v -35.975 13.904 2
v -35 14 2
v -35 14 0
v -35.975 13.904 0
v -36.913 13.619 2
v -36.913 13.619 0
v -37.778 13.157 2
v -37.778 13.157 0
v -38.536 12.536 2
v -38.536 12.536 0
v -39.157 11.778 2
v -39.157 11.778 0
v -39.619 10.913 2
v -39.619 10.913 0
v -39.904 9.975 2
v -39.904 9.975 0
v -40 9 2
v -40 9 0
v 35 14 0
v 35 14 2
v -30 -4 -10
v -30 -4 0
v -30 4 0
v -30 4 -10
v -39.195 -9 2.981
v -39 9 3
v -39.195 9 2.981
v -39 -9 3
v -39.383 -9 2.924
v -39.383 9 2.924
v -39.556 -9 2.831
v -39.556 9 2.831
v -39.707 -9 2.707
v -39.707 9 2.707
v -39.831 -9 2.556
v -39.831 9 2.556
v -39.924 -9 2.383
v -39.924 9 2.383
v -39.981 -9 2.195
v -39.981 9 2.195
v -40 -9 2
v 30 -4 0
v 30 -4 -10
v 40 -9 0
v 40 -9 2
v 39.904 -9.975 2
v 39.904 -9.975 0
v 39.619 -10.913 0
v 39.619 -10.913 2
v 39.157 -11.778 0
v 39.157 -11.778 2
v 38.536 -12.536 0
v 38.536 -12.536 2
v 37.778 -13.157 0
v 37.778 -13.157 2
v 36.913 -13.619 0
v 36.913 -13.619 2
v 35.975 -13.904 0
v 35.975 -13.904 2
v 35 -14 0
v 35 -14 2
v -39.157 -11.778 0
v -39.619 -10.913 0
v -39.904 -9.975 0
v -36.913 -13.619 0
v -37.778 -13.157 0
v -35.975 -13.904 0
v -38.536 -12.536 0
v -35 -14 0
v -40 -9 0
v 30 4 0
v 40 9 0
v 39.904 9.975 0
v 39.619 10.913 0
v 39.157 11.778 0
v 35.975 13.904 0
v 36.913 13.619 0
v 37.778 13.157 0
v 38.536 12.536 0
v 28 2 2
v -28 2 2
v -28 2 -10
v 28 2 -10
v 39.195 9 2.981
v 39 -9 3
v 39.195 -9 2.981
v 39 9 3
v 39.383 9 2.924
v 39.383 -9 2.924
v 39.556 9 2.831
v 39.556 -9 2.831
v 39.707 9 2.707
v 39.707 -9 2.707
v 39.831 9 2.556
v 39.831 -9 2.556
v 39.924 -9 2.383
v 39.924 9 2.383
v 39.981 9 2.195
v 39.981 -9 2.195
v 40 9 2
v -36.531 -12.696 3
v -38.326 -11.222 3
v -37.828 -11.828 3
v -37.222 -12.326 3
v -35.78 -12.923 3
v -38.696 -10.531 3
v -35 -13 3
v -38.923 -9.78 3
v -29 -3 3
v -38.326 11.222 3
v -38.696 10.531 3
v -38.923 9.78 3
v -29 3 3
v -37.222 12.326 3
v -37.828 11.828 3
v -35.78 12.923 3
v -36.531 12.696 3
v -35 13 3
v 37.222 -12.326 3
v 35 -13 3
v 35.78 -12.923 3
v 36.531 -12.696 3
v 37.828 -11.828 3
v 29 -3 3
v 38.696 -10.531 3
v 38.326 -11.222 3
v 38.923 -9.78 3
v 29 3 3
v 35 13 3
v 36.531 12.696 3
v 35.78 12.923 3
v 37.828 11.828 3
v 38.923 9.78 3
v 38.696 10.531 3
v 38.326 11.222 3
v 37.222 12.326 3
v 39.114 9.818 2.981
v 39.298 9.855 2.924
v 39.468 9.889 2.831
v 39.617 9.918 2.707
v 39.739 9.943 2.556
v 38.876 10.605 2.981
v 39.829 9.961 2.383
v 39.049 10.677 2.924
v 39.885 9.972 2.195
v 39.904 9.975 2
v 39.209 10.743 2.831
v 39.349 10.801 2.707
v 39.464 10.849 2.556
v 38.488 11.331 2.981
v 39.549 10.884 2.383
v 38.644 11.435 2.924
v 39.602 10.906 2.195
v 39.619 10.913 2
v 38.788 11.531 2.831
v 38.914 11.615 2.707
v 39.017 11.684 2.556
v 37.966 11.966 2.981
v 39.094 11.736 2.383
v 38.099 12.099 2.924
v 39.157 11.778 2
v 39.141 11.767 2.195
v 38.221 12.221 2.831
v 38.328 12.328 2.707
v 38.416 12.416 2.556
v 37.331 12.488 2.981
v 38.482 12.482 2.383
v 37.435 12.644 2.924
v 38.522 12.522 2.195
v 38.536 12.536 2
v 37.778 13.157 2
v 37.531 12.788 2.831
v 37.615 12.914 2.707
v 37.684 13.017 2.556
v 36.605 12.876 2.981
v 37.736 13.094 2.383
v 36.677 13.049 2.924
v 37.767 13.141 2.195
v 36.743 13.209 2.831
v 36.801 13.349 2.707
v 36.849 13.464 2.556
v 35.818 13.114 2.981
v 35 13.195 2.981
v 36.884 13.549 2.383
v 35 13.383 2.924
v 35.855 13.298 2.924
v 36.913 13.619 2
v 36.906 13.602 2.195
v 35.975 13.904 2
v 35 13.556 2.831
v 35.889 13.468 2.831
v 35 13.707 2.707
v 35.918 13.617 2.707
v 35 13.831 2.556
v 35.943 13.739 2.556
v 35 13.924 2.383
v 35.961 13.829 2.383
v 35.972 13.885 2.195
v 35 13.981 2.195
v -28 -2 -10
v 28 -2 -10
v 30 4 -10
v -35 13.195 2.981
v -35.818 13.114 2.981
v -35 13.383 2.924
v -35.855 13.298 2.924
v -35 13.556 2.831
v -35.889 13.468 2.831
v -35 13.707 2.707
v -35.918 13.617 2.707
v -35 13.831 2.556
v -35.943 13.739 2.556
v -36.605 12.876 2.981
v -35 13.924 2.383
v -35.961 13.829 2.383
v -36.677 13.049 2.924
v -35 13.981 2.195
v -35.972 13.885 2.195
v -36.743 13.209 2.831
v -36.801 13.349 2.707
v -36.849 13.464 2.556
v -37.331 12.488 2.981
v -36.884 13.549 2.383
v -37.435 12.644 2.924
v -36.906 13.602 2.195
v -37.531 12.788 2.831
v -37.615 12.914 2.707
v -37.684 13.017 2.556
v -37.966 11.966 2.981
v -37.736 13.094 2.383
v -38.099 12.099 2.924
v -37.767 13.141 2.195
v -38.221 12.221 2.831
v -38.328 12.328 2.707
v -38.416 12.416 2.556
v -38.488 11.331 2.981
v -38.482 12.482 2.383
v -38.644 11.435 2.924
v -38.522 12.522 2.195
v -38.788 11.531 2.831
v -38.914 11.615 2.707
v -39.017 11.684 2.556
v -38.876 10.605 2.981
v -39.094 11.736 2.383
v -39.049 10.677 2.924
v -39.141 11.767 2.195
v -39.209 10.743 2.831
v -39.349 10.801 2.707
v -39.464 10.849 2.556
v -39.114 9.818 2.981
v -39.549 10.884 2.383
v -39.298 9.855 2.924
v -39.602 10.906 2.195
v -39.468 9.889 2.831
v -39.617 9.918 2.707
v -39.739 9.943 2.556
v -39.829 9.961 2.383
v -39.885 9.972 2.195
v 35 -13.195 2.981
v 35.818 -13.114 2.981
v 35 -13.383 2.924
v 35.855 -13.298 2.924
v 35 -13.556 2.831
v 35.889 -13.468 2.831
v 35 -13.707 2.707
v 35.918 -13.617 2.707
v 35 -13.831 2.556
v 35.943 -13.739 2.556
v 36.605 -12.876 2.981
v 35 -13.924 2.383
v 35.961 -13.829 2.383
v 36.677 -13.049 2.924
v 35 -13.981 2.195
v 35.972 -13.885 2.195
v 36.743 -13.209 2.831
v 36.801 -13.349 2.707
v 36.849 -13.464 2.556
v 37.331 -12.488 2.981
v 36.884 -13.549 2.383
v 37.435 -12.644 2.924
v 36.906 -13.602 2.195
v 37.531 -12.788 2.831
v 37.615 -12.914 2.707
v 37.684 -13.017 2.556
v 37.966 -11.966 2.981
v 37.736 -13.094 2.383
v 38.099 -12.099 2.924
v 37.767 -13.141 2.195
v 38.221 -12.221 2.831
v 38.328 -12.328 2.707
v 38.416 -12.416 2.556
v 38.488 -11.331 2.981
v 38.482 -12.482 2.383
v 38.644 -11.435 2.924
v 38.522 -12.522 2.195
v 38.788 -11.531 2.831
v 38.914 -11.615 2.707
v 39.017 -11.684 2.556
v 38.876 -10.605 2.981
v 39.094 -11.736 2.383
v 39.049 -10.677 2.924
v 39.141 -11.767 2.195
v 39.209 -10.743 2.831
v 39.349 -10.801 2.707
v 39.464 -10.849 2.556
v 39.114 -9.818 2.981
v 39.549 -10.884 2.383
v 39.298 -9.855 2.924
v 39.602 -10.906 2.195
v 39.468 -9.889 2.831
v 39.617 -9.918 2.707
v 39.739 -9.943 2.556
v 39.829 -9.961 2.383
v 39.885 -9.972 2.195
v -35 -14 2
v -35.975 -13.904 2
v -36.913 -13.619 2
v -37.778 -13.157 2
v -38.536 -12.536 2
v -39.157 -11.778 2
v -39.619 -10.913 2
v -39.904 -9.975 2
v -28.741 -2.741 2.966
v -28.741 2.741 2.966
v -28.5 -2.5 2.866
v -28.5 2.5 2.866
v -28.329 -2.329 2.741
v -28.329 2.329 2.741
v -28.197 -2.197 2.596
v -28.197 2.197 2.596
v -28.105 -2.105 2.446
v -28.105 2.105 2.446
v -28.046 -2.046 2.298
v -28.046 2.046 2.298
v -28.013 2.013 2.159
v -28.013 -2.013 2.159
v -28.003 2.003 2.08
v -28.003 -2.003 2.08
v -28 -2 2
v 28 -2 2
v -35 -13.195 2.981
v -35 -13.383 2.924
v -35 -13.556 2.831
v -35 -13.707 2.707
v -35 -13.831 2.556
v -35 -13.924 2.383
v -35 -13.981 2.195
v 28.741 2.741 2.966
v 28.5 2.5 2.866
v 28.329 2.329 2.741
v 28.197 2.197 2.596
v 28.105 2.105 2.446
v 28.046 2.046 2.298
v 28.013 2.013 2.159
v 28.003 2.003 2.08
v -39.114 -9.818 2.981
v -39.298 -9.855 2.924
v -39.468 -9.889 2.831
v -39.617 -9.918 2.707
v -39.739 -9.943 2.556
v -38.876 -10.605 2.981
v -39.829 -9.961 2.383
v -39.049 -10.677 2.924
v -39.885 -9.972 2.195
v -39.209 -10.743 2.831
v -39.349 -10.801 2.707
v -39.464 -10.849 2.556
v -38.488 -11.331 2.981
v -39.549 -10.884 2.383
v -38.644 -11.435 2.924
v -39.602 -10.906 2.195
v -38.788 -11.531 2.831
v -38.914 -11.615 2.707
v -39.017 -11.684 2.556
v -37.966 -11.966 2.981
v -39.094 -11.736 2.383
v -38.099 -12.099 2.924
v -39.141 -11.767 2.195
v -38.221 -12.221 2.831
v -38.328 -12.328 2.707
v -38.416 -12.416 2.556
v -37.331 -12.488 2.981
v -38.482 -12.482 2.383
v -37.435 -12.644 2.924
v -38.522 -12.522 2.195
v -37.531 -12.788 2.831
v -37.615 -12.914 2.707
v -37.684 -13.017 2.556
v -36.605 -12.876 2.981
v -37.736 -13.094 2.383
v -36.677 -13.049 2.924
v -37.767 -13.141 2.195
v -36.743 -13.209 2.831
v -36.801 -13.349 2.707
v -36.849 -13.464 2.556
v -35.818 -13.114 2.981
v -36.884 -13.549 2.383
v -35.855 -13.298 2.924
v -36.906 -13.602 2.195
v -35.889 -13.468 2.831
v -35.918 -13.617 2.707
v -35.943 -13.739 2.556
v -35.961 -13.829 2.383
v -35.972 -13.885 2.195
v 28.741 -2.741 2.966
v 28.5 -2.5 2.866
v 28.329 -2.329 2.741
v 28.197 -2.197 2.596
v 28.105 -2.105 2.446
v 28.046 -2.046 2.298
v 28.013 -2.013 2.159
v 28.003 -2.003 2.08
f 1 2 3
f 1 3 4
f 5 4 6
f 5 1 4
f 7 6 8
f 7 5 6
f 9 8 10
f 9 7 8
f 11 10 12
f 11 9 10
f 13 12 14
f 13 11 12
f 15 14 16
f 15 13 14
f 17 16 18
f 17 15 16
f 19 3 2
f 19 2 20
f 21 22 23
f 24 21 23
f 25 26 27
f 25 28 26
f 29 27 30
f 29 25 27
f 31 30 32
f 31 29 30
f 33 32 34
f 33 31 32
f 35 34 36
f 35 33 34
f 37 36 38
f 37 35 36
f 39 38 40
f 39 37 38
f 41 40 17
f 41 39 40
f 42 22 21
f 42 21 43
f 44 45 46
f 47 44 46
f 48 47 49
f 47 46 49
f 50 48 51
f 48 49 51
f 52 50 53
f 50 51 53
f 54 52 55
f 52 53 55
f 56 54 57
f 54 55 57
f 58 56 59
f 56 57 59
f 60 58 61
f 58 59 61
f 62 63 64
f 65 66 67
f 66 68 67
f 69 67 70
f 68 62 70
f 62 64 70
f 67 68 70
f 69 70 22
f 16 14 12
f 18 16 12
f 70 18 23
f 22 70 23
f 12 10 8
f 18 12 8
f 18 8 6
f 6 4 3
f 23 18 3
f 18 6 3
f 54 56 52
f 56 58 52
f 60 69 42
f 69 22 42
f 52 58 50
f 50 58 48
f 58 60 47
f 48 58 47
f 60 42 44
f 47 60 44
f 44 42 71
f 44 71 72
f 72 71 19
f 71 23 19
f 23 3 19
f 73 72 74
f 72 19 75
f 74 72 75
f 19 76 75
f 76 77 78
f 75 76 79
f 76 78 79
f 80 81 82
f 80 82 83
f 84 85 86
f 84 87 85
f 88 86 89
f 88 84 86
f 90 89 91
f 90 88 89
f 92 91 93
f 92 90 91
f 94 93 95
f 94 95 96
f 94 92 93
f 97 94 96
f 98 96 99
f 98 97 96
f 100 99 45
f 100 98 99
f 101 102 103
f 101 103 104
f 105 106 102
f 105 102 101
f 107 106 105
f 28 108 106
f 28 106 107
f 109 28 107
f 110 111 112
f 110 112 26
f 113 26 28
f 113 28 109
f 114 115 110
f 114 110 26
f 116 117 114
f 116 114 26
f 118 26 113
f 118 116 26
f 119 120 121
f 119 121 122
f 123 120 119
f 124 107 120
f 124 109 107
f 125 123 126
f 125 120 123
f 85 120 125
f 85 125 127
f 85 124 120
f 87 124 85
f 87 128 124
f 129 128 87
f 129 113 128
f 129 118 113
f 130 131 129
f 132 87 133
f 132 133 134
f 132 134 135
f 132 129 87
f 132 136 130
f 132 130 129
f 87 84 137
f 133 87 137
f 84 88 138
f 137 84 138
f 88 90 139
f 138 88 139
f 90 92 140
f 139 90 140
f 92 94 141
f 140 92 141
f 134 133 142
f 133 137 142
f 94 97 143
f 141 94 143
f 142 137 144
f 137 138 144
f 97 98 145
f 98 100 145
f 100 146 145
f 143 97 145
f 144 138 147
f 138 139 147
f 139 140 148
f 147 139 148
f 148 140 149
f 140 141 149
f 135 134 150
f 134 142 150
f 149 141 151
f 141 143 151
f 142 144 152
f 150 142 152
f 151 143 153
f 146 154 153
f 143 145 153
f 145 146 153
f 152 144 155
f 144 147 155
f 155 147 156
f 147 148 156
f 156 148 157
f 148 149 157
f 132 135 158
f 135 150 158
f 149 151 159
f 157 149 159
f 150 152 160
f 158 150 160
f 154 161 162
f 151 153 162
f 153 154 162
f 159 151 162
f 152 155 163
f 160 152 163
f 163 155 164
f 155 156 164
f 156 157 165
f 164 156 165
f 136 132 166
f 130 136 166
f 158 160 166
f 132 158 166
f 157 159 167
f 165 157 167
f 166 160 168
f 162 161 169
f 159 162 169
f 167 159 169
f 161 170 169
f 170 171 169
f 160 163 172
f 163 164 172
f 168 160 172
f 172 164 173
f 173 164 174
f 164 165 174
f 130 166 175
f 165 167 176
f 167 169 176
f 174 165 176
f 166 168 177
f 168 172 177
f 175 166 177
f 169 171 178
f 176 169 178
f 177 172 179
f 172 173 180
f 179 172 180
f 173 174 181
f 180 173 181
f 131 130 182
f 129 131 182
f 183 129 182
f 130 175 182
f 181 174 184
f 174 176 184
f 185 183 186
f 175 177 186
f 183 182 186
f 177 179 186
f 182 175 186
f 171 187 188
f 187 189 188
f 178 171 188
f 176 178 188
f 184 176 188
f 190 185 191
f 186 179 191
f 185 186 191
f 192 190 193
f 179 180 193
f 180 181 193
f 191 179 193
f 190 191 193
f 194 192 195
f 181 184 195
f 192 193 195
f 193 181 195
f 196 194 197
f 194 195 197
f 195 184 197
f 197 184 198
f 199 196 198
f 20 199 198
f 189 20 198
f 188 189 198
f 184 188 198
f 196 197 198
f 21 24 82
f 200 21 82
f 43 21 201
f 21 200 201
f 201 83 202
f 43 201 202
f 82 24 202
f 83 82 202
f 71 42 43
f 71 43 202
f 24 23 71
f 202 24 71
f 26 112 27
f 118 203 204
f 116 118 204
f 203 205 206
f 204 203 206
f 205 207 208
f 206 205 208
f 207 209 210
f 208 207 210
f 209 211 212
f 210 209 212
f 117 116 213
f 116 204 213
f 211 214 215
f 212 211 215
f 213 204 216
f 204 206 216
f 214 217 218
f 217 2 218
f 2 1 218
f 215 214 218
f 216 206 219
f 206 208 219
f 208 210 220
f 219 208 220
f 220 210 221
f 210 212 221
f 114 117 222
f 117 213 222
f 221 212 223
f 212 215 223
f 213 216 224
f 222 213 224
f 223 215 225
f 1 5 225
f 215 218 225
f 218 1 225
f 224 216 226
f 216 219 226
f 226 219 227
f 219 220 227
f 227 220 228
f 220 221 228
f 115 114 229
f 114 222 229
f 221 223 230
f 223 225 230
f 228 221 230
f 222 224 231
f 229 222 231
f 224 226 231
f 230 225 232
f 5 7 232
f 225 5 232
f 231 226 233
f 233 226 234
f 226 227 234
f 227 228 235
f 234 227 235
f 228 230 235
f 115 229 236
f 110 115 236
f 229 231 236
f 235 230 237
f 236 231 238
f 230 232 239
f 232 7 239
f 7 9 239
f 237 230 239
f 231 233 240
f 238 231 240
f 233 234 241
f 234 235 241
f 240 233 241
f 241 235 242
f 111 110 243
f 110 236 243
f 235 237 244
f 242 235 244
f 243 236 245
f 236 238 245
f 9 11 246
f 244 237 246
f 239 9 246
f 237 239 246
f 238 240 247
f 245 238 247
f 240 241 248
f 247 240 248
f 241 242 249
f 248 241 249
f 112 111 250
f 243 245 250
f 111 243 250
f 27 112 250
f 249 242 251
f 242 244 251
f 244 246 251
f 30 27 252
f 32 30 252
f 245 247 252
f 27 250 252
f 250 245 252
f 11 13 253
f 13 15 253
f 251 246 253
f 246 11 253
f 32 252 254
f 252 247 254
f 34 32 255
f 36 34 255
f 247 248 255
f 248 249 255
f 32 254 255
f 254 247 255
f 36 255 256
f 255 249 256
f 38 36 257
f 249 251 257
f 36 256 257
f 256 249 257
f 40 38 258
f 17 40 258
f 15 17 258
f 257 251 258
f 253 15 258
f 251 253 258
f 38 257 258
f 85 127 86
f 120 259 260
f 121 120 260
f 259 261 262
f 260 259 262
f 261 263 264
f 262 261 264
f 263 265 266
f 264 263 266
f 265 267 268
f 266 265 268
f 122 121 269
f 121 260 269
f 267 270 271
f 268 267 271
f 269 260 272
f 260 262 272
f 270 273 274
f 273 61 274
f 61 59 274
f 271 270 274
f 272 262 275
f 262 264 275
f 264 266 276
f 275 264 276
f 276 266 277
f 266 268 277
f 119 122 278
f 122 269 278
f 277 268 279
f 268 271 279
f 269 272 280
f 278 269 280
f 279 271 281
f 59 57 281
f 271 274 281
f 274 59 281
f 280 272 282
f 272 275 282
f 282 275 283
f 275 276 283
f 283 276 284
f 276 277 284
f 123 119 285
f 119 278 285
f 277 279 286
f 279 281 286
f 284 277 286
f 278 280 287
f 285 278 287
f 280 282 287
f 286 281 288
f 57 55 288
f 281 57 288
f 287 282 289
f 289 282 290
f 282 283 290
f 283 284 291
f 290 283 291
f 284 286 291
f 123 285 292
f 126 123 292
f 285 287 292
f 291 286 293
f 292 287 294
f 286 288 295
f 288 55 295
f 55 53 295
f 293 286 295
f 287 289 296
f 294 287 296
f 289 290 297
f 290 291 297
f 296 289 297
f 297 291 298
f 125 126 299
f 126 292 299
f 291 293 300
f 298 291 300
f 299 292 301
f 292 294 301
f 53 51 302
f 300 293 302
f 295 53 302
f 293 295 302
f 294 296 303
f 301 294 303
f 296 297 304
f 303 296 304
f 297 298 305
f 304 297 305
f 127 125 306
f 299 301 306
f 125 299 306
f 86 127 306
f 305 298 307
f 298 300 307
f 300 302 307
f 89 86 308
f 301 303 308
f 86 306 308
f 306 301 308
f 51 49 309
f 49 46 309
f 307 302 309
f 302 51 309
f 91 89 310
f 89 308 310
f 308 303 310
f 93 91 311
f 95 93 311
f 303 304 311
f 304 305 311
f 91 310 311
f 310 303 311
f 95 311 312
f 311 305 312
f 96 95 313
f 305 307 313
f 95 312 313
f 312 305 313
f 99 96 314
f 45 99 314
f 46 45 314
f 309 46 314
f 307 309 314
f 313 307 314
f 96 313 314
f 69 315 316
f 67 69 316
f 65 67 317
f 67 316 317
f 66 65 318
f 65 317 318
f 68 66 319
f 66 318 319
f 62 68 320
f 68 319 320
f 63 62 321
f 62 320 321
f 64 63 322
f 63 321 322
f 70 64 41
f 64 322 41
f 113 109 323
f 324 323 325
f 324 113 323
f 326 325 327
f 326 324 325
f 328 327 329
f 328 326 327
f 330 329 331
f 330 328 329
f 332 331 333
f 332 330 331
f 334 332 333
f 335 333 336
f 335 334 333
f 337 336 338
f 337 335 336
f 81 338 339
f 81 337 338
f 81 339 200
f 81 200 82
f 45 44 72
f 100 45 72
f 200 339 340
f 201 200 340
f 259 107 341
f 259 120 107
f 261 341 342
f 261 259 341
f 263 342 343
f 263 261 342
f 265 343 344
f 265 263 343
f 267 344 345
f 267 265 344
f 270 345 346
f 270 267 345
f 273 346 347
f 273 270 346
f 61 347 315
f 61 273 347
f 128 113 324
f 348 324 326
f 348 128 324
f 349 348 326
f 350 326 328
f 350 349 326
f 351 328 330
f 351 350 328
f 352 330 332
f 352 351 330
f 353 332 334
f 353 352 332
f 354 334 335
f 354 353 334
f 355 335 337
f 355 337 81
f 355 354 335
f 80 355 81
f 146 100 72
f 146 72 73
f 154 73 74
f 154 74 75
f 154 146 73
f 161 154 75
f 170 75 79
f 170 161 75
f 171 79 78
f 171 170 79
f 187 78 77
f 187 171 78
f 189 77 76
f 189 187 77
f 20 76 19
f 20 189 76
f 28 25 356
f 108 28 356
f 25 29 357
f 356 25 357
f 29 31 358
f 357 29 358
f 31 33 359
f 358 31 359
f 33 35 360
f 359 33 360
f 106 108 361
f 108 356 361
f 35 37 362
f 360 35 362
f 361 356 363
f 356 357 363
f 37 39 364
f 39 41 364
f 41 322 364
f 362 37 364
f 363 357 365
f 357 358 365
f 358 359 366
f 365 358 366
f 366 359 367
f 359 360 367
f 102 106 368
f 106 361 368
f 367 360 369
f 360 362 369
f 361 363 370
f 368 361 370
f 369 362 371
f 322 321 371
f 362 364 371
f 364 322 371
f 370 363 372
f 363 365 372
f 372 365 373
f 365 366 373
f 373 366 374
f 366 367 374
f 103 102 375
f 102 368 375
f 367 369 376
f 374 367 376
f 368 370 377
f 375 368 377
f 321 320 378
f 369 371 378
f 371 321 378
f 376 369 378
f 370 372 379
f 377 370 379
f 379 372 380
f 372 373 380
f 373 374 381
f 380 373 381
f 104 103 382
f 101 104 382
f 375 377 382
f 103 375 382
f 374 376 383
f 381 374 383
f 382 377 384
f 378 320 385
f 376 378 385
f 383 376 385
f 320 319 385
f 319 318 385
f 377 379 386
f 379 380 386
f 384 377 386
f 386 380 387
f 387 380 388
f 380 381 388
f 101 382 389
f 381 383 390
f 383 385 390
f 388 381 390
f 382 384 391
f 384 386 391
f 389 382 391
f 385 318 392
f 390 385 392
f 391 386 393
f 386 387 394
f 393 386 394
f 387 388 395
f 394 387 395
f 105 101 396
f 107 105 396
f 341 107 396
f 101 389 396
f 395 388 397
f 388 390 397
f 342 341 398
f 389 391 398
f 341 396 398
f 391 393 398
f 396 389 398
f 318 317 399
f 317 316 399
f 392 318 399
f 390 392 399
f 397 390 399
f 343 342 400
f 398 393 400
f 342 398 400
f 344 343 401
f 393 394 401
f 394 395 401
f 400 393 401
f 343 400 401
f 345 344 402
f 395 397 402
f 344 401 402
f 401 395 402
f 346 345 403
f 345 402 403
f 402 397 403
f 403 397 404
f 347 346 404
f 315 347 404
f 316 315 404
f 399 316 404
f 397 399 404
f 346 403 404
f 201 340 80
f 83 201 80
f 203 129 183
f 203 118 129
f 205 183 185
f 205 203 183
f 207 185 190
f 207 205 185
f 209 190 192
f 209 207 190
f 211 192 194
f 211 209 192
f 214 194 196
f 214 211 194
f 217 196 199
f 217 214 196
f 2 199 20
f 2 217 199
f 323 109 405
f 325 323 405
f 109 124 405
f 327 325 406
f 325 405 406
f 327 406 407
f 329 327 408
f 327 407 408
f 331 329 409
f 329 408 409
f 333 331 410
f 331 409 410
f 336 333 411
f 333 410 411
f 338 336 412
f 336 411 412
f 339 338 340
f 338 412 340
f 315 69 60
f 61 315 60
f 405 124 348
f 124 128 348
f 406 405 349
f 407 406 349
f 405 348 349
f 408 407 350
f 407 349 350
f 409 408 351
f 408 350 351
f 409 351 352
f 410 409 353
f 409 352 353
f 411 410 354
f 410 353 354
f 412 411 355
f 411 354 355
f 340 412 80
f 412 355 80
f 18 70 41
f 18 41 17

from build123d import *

# Parameters (mm, degrees)
F0_W     = 80
F0_H     = 28
F0_W_2   = 60
F0_H_2   = 8
F0_W_3   = 56
F0_H_3   = 4
F1_DEPTH = 3
F2_DEPTH = 10
F3_R     = 5
F4_R     = 1


with BuildPart() as f1:
    # F0 (on Top) → F1 (new body)
    with BuildSketch(Plane.XY):
        Rectangle(F0_W, F0_H)
        Rectangle(F0_W_2, F0_H_2, mode=Mode.SUBTRACT)
        Rectangle(F0_W_2, F0_H_2)
        Rectangle(F0_W_3, F0_H_3, mode=Mode.SUBTRACT)
    extrude(amount=F1_DEPTH)

    # F0 (on Top) → F2 (join)
    with BuildSketch(Plane.XY):
        Rectangle(F0_W_2, F0_H_2)
        Rectangle(F0_W_3, F0_H_3, mode=Mode.SUBTRACT)
    extrude(amount=-F2_DEPTH)

    # F3
    f3_edges = [f1.edges().sort_by_distance(p)[0] for p in [
        (-40, 14, 1.5),
        (-40, -14, 1.5),
        (40, 14, 1.5),
        (40, -14, 1.5),
    ]]
    fillet(f3_edges, radius=F3_R)

    # F4
    f4_edges = [f1.edges().sort_by_distance(p)[0] for p in [
        (40, 0, 3),
        (38.535534, -12.535534, 3),
        (38.535534, 12.535534, 3),
        (0, -14, 3),
        (0, 14, 3),
        (-38.535534, -12.535534, 3),
        (-38.535534, 12.535534, 3),
        (-40, 0, 3),
        (0, 2, 3),
        (28, 0, 3),
        (0, -2, 3),
        (-28, 0, 3),
    ]]
    fillet(f4_edges, radius=F4_R)


solid = f1.part
